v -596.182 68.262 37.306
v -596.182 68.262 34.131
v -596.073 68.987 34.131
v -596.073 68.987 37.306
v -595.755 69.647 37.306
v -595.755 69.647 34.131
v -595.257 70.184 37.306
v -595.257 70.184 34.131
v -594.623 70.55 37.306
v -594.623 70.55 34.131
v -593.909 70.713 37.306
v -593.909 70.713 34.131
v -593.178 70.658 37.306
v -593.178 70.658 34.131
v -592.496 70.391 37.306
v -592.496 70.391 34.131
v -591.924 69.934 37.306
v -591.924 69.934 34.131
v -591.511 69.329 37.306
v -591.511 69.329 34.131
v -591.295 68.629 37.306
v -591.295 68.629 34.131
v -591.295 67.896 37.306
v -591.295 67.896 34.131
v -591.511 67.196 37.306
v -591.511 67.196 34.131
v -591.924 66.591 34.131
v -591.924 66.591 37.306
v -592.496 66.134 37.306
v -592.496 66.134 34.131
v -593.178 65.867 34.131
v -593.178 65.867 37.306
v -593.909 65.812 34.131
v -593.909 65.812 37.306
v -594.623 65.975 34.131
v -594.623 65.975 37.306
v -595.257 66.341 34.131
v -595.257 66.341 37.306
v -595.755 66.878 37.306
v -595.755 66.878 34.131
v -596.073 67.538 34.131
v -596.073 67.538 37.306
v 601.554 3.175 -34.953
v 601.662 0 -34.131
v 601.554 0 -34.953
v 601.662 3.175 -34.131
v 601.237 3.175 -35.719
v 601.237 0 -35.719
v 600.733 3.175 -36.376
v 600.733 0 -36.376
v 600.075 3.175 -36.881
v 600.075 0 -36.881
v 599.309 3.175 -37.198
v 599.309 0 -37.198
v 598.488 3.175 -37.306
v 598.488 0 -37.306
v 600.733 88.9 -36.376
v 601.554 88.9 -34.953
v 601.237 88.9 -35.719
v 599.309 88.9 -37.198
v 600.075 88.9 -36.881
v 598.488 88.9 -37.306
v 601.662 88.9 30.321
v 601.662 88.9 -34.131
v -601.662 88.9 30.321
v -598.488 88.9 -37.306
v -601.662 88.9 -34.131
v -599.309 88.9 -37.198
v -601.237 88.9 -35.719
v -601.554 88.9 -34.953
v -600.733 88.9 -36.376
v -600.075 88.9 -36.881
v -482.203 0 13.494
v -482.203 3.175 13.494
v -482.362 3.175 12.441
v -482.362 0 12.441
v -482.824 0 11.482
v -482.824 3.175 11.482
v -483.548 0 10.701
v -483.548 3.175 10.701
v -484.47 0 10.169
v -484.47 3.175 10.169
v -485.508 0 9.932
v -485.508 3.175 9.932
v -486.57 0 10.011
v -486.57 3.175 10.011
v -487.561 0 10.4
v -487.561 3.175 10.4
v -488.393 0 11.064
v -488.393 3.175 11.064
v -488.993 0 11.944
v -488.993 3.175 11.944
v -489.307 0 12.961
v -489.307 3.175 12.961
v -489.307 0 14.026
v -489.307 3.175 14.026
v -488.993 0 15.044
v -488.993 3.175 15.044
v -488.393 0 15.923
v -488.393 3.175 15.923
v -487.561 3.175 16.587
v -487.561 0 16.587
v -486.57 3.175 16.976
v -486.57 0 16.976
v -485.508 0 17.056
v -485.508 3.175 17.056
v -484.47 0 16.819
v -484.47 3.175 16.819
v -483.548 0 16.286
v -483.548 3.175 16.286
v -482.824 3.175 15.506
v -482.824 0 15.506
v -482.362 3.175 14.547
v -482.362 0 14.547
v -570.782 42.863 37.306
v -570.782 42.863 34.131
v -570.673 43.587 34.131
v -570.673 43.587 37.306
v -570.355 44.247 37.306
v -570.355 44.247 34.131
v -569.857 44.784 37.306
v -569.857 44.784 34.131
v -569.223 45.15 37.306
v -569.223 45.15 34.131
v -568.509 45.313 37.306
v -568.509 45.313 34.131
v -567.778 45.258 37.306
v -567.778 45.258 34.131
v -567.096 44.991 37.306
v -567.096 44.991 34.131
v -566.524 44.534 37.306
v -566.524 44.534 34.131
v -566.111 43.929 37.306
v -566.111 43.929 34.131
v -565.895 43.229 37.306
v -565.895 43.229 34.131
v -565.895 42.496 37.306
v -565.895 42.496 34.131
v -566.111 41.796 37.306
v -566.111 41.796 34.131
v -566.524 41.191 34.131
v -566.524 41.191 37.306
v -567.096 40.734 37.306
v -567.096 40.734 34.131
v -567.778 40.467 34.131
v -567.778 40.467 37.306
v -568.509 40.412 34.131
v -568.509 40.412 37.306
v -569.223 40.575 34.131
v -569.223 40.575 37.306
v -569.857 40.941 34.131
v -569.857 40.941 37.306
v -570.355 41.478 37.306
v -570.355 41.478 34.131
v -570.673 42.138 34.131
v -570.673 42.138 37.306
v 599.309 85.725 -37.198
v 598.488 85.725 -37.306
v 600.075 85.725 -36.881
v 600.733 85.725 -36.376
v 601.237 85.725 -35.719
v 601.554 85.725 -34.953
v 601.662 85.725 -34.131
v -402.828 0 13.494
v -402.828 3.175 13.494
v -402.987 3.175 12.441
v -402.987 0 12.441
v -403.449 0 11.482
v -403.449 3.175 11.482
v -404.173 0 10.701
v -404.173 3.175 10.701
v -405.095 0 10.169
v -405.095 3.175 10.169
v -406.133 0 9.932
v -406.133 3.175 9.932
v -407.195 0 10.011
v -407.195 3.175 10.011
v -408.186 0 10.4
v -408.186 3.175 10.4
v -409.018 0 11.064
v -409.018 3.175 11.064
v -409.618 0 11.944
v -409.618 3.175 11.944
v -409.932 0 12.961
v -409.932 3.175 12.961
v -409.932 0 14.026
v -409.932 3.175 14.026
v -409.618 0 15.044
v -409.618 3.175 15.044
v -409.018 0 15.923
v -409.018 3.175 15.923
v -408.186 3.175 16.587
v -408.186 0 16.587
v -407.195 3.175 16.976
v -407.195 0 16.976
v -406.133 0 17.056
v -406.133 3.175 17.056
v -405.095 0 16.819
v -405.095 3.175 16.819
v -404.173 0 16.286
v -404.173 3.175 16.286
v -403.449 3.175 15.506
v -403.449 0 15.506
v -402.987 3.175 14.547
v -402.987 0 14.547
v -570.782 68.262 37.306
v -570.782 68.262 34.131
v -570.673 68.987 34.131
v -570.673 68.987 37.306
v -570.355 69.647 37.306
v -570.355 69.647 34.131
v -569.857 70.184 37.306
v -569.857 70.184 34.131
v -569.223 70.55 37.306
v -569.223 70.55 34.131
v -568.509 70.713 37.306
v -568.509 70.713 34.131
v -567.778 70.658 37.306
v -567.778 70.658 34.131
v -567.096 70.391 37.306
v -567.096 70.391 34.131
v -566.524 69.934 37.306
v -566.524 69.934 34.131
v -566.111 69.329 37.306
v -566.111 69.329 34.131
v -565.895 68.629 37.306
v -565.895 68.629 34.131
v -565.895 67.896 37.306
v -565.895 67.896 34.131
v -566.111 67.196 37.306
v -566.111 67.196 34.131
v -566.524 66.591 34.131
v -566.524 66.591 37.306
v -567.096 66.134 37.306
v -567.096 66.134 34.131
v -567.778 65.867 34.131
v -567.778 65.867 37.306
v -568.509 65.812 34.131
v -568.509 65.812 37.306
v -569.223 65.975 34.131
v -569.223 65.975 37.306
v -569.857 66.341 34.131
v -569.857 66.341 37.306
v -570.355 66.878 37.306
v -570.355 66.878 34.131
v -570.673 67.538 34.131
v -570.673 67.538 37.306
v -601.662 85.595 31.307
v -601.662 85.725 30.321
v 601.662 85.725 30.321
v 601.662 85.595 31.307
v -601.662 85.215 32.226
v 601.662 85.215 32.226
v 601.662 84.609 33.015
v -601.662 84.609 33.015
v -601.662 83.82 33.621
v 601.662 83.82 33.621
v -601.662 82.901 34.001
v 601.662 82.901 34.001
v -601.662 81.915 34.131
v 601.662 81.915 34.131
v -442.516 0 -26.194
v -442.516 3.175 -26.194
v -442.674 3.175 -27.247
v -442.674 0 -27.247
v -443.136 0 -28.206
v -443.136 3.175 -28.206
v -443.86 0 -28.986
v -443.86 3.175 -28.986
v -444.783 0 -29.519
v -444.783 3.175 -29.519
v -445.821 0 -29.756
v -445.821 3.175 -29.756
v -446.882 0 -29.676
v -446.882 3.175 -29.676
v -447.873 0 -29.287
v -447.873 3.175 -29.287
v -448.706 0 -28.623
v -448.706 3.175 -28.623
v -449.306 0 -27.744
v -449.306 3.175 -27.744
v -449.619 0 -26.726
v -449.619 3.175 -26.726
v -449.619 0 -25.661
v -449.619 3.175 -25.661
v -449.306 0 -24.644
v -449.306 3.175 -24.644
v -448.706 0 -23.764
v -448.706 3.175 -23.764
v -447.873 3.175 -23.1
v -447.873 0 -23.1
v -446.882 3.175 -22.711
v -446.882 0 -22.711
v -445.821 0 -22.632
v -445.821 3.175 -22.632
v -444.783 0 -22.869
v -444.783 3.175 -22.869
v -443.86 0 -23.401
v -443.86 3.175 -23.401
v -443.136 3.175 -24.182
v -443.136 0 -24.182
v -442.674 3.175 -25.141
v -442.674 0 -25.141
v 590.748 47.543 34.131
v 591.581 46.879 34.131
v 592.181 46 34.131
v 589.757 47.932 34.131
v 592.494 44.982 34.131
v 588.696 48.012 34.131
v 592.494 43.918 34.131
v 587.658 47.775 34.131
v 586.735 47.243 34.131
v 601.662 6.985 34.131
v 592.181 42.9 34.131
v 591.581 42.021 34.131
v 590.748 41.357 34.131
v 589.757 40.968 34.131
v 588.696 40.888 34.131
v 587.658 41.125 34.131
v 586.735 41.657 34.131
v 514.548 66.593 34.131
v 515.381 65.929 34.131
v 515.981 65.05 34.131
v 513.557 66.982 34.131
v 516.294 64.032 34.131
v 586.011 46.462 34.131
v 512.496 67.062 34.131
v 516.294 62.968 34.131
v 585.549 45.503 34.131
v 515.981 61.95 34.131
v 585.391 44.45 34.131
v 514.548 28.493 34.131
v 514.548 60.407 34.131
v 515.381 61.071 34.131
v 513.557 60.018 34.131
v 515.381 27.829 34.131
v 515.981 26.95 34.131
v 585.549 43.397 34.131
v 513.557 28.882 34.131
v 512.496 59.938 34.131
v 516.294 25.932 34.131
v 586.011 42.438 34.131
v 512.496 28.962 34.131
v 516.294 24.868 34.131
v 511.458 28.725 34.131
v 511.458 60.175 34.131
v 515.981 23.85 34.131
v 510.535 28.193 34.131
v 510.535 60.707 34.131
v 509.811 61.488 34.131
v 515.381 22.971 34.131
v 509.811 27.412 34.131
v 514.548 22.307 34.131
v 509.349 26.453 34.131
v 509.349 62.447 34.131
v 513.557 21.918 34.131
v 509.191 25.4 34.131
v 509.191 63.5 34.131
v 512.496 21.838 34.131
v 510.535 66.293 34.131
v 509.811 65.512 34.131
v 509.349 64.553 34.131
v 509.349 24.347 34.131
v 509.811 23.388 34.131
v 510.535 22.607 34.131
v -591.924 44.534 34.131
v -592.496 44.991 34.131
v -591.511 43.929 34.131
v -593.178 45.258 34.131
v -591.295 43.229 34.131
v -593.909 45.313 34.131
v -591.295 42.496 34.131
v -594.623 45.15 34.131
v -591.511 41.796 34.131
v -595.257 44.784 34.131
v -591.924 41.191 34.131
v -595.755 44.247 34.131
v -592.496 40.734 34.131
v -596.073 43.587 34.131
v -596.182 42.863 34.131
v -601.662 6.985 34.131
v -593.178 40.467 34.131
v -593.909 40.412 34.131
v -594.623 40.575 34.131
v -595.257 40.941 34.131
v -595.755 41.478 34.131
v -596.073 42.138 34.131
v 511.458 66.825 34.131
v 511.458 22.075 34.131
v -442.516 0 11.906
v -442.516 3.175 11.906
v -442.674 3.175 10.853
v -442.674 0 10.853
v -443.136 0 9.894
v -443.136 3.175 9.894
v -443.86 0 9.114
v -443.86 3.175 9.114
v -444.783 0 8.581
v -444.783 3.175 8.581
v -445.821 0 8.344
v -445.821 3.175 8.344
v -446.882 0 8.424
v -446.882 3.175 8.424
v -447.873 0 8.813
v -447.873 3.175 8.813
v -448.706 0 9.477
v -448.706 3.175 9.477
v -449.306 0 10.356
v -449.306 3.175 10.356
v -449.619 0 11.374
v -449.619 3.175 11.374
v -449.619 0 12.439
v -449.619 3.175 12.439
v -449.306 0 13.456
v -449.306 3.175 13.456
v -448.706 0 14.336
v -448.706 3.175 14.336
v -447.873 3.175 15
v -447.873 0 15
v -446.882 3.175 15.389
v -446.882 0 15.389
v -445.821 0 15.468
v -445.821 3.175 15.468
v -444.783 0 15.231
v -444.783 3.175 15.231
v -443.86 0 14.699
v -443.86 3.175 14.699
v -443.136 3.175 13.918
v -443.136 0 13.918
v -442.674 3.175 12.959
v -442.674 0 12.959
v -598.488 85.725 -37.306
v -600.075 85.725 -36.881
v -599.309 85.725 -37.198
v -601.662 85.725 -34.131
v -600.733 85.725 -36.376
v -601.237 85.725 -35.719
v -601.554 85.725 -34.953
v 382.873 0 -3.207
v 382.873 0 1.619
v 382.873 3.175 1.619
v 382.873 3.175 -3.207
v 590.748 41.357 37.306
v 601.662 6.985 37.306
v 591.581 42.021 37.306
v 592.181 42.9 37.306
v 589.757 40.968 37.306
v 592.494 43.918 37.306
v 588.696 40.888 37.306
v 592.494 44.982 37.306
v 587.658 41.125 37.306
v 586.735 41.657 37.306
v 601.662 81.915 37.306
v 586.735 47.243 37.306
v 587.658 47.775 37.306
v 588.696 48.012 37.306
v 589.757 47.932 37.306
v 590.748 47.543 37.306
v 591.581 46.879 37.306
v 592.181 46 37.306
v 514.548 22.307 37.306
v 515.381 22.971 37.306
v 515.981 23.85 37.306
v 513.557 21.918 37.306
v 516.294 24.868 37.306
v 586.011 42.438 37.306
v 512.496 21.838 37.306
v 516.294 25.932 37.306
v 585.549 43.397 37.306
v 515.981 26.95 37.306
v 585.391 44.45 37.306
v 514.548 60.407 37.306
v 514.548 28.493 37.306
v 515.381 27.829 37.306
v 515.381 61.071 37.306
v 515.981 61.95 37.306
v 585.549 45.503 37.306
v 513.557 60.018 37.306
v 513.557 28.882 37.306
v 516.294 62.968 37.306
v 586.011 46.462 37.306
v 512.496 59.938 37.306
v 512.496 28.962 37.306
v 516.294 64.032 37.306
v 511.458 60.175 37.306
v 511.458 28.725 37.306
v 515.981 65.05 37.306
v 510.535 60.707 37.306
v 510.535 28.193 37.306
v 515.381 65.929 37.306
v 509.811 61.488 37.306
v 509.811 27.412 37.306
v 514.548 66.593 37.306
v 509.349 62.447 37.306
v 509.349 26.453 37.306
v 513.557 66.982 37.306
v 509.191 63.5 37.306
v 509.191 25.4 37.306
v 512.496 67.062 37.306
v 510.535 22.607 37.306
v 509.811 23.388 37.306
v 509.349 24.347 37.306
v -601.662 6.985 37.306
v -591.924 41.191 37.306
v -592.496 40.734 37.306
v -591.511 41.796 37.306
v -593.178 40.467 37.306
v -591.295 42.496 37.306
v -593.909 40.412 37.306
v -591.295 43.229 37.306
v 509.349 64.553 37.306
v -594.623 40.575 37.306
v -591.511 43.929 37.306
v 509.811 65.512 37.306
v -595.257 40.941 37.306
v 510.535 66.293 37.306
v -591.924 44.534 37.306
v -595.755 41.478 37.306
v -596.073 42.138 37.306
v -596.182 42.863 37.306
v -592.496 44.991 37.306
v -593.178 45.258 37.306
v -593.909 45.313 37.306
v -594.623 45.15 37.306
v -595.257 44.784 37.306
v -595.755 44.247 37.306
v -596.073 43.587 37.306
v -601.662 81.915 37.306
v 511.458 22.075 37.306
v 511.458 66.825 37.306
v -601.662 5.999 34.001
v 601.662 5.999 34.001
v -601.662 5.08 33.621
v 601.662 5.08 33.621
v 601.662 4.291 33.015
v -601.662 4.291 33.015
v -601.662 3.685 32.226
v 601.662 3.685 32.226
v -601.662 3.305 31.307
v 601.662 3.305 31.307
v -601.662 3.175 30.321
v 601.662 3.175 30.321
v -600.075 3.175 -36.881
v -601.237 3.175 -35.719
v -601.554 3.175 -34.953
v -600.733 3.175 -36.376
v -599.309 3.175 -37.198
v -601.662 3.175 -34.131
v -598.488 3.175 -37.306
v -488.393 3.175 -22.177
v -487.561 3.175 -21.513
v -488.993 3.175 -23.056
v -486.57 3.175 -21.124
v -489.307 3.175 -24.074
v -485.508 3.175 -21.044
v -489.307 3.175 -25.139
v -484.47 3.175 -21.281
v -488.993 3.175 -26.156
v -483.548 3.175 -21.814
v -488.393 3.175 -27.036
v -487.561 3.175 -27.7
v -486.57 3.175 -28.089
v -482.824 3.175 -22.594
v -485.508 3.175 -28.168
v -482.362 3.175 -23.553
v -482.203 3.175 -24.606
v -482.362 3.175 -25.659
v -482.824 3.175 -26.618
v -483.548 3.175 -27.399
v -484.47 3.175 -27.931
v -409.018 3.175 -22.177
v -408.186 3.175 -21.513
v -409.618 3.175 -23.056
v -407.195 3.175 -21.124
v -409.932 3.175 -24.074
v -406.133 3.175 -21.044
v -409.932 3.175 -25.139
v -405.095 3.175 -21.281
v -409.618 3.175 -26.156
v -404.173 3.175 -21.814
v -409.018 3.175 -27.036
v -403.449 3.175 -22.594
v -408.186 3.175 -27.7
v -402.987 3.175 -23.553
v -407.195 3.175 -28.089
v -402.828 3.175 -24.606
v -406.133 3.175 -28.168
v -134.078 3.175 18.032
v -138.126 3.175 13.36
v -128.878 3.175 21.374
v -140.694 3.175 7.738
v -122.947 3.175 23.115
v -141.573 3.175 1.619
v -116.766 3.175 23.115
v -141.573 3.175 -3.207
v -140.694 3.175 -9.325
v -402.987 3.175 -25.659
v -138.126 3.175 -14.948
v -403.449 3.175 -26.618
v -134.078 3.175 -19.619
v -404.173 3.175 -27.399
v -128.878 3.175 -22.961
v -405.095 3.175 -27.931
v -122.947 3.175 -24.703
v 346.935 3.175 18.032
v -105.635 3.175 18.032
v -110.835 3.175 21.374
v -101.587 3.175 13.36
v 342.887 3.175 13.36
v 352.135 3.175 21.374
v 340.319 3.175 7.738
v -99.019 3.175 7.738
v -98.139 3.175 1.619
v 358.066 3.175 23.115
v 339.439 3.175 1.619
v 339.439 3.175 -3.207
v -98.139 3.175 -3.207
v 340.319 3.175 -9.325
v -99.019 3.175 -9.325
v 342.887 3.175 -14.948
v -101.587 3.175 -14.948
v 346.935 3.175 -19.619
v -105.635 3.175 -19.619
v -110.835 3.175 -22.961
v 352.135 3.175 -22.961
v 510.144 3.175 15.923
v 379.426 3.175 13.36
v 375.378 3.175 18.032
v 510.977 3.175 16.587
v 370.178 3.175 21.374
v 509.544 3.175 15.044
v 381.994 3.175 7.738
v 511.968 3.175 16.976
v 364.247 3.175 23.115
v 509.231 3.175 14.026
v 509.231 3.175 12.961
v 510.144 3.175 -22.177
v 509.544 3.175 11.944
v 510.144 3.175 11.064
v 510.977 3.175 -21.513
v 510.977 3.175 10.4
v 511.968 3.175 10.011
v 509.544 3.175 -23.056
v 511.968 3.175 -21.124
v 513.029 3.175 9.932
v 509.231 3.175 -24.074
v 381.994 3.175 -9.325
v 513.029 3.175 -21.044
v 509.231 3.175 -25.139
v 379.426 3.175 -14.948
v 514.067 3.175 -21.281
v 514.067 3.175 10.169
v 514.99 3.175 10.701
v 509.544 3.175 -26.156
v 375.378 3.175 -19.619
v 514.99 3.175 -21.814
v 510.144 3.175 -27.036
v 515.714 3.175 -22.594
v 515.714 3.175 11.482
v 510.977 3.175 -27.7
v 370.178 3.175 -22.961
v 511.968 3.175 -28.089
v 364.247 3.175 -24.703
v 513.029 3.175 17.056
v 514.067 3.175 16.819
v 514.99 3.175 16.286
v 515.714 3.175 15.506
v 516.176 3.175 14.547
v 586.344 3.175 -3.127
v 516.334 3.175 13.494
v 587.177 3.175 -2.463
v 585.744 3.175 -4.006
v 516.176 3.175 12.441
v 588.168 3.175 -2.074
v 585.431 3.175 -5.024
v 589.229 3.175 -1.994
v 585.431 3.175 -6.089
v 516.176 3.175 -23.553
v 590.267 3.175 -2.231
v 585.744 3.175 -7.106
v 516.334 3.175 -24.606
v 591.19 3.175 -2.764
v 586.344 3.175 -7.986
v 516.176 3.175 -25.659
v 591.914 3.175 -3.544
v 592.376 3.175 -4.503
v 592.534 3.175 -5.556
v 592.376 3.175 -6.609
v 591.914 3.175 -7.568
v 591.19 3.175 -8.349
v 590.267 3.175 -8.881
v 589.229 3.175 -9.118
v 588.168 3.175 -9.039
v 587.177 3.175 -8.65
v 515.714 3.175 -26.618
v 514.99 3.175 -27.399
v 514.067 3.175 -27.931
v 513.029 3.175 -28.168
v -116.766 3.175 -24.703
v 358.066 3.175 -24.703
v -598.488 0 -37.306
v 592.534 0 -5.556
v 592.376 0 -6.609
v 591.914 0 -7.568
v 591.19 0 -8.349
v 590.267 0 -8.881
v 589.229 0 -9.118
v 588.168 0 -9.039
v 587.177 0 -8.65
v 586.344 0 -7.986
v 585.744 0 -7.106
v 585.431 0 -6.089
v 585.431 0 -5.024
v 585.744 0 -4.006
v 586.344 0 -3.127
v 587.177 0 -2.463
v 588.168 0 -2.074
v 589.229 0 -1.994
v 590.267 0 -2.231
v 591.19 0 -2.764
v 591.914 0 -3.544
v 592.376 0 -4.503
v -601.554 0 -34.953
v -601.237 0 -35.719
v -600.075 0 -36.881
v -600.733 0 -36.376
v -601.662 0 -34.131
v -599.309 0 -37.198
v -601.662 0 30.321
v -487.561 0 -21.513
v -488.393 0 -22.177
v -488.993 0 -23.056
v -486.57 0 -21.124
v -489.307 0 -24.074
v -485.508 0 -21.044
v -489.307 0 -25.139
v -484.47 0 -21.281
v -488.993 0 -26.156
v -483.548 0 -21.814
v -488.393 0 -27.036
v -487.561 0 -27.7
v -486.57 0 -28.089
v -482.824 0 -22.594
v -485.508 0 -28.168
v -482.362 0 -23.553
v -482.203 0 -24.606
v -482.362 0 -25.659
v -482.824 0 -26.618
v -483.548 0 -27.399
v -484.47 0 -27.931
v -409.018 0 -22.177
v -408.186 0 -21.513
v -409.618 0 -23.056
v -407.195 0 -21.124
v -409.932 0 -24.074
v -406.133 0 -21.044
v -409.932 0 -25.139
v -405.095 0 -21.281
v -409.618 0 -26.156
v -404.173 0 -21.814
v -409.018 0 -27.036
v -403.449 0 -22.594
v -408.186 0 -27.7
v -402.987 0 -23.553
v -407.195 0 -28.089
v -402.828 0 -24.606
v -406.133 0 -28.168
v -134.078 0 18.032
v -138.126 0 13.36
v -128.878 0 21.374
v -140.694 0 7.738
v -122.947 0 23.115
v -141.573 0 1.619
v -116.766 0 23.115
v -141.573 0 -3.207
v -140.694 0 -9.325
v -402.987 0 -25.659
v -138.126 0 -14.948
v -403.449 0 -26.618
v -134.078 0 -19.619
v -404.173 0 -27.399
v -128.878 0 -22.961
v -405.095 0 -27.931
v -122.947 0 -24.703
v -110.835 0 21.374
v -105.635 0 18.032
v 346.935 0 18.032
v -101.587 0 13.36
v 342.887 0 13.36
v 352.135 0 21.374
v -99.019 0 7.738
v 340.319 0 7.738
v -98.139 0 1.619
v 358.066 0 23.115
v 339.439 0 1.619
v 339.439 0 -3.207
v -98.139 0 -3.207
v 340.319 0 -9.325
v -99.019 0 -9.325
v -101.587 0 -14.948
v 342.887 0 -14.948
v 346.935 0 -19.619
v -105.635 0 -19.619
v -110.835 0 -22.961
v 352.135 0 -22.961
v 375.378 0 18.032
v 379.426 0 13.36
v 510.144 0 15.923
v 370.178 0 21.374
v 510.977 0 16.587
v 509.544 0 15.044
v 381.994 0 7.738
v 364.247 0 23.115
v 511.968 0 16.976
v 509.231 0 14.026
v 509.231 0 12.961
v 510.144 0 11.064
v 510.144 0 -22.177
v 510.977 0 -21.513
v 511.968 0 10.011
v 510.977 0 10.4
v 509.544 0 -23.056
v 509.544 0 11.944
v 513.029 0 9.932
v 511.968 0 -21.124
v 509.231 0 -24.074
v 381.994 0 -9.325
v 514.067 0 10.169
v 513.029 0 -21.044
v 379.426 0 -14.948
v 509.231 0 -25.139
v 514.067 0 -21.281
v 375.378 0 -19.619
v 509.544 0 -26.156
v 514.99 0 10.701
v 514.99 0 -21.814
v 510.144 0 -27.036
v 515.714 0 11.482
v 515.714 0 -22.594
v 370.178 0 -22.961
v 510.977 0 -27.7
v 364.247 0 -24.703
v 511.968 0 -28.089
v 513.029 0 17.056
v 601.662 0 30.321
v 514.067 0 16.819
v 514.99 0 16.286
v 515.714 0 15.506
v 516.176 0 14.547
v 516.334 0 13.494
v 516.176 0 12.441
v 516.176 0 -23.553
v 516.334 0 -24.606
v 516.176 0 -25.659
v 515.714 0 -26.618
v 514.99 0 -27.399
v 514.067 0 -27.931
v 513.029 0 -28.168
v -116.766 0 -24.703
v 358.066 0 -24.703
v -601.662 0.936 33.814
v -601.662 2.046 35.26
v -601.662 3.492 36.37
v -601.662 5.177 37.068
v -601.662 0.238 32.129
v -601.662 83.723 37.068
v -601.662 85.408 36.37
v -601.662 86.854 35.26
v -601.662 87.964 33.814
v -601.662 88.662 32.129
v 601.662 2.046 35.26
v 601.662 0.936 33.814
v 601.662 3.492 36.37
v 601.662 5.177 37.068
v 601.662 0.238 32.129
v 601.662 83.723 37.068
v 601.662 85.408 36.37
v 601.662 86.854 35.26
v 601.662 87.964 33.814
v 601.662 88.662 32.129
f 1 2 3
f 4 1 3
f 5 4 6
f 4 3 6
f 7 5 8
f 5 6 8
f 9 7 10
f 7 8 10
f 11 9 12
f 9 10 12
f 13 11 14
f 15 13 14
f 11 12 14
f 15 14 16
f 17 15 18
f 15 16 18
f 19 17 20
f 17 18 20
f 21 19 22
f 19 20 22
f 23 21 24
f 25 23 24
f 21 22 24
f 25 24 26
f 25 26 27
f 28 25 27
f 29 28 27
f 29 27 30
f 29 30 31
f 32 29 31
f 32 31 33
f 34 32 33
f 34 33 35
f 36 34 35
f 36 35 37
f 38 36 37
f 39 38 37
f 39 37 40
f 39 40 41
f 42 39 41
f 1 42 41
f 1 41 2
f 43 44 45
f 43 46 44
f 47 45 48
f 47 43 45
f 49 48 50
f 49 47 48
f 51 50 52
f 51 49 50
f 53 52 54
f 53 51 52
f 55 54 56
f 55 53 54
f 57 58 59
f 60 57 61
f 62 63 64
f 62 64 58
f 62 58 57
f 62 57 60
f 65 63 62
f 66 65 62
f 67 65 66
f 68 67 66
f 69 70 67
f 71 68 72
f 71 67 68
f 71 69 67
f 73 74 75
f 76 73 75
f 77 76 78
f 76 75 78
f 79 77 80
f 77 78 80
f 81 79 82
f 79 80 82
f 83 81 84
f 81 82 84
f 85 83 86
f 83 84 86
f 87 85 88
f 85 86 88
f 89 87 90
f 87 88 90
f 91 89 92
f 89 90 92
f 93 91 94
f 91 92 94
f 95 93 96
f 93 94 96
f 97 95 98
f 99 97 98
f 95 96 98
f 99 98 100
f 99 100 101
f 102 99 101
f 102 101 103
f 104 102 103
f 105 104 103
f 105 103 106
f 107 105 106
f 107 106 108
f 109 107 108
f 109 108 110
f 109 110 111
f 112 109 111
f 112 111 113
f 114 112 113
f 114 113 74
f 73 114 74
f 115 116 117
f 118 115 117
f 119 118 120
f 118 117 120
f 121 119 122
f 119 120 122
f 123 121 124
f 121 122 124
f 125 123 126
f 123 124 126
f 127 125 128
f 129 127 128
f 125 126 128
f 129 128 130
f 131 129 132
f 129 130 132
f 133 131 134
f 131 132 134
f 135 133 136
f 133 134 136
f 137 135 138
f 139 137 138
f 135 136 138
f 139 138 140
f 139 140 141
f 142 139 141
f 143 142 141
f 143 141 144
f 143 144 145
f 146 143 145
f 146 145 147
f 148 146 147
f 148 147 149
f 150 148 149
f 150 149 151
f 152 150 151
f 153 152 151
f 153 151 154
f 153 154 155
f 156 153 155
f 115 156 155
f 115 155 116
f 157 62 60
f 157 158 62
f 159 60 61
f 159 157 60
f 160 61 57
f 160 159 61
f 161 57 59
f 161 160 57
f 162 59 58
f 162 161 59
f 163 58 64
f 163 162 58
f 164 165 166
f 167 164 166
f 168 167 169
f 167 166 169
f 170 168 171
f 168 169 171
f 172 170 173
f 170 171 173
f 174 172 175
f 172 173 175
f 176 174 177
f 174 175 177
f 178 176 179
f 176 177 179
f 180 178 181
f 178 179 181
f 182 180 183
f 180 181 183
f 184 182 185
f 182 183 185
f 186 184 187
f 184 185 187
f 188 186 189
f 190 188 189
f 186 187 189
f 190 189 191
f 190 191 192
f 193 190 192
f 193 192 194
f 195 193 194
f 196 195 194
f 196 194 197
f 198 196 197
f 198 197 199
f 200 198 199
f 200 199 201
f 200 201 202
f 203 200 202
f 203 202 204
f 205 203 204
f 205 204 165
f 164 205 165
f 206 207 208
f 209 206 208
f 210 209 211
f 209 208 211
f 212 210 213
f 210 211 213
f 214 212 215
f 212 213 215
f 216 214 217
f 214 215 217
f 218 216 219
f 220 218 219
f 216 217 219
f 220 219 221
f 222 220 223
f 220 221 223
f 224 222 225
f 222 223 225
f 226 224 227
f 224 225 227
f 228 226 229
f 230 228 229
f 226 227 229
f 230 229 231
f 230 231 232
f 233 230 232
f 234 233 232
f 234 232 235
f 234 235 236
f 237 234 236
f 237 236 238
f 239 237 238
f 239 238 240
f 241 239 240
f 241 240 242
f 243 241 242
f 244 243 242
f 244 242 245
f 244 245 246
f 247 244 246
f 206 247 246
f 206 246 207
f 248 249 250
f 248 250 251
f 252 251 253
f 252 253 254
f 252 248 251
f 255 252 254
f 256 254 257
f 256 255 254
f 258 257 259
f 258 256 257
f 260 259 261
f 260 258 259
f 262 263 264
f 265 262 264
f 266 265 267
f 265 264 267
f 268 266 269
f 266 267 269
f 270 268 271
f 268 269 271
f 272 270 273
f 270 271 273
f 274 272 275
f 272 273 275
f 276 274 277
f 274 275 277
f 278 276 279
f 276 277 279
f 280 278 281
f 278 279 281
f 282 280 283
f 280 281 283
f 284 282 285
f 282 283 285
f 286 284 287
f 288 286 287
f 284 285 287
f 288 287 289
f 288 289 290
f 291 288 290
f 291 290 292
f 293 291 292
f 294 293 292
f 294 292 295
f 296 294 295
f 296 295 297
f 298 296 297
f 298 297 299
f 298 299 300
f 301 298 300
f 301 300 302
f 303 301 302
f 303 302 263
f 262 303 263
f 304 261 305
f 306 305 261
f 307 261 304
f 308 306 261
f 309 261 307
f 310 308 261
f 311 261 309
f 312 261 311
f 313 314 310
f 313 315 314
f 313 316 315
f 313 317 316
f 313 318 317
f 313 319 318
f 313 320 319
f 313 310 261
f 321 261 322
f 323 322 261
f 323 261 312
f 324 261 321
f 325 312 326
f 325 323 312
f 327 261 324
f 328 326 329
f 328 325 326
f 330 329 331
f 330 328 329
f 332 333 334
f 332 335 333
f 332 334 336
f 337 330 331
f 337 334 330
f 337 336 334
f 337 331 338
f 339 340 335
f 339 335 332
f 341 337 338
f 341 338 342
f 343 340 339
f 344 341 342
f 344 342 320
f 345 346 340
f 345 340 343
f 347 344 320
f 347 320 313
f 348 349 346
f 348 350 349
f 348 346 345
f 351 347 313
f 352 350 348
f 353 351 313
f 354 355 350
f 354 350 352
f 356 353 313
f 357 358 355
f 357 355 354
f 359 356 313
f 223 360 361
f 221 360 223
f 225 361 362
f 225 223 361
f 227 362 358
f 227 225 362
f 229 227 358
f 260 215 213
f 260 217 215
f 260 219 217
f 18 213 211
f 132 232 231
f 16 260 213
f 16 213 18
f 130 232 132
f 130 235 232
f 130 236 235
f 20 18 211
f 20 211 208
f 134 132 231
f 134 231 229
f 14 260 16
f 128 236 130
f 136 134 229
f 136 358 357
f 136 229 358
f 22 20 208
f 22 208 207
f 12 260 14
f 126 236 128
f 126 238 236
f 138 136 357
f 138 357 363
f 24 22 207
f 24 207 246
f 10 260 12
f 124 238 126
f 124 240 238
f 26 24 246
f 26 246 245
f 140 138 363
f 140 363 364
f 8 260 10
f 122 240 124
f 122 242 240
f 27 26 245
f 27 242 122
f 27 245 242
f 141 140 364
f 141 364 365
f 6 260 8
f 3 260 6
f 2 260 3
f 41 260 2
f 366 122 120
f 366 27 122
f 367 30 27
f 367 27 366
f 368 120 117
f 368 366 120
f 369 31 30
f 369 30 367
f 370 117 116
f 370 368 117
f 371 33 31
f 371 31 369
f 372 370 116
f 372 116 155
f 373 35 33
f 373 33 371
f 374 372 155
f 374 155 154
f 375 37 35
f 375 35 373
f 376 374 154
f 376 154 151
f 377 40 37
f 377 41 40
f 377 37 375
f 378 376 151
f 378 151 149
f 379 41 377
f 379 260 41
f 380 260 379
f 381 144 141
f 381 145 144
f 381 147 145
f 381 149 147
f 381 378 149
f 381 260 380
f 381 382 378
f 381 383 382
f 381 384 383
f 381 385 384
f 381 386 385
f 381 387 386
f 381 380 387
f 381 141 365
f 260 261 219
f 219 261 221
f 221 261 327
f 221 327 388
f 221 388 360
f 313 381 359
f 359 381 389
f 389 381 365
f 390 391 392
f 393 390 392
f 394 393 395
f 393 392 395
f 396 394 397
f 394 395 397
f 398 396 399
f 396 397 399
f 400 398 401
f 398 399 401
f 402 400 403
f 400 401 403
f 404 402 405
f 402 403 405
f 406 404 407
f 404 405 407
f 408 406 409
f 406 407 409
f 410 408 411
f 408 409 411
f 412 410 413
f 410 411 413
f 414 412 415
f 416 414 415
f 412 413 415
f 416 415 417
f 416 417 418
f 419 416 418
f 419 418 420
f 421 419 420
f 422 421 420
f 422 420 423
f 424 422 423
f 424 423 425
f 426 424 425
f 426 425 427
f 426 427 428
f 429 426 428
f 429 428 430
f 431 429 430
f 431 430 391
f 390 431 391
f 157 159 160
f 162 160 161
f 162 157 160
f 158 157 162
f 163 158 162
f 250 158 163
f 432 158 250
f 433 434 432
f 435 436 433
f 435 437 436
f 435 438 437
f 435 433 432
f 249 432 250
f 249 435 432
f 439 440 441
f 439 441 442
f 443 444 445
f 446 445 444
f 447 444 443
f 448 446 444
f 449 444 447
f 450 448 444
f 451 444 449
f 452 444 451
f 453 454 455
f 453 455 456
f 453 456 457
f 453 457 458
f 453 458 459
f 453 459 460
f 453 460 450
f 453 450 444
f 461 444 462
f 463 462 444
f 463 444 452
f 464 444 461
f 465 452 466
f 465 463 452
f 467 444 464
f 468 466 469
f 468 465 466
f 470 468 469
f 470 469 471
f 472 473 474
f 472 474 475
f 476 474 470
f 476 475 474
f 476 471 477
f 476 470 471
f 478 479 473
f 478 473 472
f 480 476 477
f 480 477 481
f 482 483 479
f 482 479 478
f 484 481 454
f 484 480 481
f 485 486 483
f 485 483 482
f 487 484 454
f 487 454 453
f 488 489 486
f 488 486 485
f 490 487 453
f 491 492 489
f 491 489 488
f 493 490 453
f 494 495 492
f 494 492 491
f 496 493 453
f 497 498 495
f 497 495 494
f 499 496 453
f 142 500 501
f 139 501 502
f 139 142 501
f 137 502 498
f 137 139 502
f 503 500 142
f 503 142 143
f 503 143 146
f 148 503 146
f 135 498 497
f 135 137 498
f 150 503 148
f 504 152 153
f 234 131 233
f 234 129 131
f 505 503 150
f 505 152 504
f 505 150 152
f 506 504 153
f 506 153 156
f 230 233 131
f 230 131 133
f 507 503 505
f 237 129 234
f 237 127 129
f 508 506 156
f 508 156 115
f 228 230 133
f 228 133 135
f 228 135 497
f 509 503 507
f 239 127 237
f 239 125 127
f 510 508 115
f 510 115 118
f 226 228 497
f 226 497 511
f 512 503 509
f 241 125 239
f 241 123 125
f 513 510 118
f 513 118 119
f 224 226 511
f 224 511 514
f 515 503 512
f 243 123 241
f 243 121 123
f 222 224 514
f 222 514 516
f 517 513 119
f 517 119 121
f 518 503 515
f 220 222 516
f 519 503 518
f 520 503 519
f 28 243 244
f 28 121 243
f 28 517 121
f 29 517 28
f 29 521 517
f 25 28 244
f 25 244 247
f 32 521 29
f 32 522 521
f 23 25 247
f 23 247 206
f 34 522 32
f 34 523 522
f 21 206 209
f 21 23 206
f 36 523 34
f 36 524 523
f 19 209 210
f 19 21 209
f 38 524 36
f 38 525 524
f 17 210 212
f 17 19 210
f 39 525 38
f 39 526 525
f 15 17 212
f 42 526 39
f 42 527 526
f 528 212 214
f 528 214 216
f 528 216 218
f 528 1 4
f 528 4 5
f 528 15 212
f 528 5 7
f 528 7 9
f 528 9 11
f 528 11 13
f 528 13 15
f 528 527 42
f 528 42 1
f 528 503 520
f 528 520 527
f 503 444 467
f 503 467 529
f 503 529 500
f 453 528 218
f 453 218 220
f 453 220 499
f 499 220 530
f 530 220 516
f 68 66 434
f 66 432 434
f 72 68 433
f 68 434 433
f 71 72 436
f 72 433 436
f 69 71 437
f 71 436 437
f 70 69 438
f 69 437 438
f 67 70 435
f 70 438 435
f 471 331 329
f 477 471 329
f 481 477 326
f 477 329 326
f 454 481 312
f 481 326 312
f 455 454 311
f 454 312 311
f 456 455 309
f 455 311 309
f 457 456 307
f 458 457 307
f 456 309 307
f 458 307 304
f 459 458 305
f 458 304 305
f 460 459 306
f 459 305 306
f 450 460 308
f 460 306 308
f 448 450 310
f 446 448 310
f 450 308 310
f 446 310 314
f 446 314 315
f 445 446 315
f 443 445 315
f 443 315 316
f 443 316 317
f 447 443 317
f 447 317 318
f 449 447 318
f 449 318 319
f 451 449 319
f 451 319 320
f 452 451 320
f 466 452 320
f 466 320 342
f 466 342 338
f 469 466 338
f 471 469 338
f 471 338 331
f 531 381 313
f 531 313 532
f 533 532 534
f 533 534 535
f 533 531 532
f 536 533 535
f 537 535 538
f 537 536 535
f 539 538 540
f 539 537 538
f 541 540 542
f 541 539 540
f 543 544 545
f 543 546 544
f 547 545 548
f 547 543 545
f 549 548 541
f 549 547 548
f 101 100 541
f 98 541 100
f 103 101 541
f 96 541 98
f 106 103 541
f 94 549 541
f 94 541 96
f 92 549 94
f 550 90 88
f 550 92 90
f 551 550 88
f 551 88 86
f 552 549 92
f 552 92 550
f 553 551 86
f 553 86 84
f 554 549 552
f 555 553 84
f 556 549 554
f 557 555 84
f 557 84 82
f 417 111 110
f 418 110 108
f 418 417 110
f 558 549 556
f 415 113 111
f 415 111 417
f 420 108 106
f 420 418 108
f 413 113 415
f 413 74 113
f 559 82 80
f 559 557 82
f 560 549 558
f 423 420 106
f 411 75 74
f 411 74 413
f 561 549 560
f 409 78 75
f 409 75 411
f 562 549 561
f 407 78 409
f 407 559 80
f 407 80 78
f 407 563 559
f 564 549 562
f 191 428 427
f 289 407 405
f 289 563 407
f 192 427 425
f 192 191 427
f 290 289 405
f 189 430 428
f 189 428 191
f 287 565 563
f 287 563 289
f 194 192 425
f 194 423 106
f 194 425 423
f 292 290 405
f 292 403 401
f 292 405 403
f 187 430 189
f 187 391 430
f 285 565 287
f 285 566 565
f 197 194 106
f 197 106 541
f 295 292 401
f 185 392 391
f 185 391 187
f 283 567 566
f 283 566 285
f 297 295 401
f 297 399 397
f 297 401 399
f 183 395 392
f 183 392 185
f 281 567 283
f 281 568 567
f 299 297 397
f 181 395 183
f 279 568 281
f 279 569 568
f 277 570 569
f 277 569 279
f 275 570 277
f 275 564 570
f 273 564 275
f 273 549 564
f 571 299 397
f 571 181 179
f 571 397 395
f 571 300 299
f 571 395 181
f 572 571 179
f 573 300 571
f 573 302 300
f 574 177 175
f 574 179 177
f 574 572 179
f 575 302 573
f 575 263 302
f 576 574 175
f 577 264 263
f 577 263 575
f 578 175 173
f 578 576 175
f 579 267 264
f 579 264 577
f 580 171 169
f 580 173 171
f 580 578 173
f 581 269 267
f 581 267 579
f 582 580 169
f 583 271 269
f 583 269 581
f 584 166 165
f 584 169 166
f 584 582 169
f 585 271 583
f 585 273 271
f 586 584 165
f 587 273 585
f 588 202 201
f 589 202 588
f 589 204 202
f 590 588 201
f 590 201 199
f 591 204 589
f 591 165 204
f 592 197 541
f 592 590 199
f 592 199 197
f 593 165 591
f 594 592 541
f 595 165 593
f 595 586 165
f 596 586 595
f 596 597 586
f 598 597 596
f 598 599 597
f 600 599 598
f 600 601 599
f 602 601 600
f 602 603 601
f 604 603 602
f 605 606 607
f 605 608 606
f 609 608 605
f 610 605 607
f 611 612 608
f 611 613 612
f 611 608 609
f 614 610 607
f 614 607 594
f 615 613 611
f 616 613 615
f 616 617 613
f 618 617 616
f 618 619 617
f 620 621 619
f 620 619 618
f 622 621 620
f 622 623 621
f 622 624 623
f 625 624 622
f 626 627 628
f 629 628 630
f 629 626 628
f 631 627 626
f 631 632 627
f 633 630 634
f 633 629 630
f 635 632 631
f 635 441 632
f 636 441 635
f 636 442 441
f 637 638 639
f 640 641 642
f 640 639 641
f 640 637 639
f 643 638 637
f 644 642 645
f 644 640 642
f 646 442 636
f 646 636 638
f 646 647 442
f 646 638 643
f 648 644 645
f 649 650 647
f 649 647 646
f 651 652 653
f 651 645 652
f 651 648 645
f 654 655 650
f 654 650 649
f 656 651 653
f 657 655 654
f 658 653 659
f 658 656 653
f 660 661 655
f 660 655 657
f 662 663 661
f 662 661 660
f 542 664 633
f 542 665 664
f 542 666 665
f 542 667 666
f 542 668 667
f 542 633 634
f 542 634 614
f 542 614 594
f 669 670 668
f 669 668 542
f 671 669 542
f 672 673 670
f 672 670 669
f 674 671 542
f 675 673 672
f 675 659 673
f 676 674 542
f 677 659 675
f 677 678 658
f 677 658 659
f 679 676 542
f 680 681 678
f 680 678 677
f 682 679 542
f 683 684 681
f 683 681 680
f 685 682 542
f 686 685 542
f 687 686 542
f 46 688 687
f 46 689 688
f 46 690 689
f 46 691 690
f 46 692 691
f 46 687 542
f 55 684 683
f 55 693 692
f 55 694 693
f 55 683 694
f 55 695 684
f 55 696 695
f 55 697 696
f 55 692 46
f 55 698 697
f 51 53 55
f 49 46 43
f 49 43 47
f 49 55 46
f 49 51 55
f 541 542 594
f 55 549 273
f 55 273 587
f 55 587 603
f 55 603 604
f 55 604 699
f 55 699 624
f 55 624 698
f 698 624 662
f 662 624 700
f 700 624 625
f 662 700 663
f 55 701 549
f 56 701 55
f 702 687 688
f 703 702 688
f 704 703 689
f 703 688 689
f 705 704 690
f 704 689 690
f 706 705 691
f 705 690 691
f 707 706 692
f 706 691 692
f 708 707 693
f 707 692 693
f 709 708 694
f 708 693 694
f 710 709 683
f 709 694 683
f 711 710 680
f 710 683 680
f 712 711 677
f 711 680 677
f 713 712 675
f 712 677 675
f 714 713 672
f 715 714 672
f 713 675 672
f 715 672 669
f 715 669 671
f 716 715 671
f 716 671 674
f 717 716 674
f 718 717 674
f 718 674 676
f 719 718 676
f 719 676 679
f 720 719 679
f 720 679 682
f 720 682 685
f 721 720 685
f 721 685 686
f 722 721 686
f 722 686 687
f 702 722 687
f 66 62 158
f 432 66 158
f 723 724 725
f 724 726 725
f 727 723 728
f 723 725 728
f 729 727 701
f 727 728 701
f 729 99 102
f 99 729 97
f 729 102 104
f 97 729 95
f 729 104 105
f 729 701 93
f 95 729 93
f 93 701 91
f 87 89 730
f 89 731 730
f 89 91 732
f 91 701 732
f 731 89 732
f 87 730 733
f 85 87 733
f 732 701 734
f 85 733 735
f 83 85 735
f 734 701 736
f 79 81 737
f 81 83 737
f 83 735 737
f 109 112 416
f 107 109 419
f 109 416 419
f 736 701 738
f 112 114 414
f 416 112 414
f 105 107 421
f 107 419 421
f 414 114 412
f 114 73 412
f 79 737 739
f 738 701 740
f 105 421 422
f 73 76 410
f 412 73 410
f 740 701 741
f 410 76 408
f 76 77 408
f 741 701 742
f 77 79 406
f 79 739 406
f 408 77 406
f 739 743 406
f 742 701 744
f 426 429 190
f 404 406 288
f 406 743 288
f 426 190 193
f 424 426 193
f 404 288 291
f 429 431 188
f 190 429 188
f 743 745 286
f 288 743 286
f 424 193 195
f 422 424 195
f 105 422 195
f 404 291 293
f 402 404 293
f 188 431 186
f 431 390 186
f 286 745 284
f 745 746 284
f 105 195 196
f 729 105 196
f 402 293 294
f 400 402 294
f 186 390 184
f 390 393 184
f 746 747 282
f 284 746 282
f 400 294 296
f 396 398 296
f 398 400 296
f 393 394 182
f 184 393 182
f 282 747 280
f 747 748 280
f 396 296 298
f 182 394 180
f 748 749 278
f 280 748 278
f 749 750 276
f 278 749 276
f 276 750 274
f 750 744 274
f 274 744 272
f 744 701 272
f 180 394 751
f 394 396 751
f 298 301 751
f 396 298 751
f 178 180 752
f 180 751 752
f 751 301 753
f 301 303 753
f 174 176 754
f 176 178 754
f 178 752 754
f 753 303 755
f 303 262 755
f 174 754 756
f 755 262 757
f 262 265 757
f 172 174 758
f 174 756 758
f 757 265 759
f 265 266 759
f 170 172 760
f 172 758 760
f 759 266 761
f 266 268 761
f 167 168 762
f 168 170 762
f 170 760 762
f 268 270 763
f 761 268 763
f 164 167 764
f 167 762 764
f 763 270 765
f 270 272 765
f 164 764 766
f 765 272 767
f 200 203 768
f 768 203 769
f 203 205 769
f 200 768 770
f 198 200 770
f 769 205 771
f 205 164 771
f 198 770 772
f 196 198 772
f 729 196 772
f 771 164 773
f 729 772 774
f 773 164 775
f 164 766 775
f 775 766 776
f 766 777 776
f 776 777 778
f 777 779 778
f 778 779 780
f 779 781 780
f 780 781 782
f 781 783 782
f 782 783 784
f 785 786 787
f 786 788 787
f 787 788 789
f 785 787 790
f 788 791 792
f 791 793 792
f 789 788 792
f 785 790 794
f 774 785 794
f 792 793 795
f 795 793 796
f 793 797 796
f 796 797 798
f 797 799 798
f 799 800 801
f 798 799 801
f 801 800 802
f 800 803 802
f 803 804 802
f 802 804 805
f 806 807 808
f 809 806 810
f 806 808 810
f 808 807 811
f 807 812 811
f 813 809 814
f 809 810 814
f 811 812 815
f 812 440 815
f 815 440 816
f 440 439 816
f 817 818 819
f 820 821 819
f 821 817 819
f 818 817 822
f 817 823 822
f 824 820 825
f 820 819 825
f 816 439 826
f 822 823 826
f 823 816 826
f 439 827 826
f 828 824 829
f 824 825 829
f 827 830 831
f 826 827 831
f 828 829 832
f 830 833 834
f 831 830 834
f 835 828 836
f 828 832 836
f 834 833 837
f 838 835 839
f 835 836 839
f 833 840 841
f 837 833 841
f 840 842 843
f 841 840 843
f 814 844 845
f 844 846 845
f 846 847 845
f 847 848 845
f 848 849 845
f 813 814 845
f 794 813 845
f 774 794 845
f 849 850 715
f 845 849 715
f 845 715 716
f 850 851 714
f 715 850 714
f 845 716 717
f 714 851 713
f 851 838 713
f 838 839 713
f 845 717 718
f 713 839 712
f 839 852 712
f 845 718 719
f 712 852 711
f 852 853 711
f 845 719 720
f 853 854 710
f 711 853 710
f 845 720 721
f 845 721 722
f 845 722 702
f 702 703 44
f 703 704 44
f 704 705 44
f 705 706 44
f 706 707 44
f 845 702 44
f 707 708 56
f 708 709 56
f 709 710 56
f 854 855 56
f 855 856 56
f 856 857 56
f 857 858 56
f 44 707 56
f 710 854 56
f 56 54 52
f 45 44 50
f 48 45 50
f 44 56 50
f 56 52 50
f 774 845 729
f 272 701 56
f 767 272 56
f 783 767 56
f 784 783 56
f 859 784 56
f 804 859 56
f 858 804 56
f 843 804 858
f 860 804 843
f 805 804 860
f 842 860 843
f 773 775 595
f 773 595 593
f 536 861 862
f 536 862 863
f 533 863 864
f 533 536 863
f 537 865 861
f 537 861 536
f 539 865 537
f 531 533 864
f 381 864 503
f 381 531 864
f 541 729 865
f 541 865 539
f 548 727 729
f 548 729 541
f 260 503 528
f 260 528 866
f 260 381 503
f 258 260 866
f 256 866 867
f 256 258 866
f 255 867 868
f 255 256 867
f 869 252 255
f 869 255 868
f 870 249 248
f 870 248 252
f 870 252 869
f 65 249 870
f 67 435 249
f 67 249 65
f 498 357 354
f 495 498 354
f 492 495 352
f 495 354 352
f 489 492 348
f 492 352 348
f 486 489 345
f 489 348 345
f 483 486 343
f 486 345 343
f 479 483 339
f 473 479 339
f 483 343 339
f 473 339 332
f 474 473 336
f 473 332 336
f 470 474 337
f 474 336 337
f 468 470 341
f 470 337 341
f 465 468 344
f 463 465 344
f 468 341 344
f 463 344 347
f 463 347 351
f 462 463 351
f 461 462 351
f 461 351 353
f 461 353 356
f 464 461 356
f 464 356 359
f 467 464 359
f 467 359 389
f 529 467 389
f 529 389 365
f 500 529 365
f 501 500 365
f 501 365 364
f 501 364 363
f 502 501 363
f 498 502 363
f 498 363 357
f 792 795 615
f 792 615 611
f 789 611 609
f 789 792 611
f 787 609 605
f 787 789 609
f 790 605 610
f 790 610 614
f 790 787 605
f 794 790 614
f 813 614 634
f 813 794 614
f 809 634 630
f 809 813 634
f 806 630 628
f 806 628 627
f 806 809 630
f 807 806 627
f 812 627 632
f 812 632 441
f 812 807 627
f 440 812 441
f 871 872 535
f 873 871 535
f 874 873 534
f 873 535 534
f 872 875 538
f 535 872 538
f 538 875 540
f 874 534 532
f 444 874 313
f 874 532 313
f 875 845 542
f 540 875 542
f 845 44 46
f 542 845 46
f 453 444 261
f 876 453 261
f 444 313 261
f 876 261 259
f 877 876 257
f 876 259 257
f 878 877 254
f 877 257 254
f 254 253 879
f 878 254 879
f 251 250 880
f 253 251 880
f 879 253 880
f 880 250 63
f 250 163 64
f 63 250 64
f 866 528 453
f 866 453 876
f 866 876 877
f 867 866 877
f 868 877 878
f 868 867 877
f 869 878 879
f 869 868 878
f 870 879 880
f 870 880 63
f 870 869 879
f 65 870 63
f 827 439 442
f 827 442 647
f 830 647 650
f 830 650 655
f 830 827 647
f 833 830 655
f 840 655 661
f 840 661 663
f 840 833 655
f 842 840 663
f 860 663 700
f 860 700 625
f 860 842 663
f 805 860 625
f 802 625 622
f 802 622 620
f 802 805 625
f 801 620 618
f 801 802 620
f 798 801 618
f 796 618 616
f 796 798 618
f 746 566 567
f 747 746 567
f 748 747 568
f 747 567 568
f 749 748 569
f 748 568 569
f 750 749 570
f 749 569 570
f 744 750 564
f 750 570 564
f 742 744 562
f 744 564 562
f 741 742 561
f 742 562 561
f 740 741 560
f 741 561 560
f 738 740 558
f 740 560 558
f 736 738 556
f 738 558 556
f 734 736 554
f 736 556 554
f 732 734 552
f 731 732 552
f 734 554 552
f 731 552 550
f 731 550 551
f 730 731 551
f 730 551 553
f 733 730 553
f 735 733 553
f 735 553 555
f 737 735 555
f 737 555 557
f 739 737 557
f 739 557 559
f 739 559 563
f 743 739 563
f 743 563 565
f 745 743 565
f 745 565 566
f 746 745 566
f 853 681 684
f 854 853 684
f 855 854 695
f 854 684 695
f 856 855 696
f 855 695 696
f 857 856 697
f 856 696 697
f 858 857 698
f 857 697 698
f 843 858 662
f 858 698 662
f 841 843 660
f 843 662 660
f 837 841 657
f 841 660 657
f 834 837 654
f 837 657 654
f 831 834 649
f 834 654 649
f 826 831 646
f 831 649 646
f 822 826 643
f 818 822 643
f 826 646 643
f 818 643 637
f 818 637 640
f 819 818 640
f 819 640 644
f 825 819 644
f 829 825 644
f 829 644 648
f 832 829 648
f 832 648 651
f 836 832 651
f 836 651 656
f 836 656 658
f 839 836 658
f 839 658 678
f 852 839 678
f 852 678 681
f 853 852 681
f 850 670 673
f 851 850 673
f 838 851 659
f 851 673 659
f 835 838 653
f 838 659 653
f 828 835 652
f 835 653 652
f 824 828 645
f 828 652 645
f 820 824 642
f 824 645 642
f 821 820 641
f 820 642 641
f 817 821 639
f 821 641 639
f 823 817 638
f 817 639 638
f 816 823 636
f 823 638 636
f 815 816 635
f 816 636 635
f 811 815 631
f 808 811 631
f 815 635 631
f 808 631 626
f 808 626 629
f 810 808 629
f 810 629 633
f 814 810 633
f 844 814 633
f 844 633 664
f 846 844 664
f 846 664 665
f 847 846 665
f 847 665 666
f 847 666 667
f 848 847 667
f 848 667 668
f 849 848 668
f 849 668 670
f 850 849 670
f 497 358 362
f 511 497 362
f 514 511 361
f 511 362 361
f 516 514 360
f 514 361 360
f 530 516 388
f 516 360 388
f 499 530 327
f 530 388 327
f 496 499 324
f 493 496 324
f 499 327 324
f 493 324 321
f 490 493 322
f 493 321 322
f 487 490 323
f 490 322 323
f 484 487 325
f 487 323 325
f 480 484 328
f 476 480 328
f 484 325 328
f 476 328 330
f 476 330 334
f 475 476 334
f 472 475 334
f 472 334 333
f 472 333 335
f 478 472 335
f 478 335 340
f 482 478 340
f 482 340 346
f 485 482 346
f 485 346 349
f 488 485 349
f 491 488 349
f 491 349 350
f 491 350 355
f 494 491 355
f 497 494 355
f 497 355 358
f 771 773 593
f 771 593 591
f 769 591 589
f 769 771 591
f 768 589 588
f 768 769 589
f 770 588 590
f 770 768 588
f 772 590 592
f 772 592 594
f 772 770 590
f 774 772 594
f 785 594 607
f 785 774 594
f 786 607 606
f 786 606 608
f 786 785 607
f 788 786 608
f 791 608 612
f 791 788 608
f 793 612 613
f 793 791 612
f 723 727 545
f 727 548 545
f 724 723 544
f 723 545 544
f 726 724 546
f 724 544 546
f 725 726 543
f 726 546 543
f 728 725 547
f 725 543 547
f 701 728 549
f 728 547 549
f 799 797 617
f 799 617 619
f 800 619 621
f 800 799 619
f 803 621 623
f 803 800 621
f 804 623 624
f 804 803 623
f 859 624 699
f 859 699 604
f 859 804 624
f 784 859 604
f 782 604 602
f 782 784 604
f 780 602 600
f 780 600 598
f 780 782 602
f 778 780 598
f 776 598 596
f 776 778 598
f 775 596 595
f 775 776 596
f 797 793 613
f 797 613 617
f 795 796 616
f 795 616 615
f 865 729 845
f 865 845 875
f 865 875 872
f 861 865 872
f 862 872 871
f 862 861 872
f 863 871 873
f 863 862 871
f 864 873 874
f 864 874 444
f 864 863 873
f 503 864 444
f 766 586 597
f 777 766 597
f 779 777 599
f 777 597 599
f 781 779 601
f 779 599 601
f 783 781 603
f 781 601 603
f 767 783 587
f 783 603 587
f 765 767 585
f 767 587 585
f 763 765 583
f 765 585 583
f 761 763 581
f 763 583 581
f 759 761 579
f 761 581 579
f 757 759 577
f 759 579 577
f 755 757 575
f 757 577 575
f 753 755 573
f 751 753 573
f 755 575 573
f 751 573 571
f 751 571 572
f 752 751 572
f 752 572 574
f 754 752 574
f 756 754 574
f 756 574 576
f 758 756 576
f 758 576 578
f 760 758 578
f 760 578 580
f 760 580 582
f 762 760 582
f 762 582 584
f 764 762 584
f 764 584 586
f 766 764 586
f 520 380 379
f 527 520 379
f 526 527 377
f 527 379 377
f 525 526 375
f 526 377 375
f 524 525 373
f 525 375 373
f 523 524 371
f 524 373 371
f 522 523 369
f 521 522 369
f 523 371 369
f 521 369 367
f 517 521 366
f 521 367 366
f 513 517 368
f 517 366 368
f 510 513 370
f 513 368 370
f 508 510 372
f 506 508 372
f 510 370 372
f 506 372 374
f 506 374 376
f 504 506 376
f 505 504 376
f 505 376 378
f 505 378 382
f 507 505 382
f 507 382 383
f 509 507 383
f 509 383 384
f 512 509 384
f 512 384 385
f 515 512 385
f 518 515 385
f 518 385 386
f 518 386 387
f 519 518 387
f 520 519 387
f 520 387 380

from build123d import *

# Parameters (mm, degrees)
SKETCH1_W                           = 1203.325
SKETCH1_H                           = 74.6125
BASE_FLANGE1_DEPTH                  = 3.175
EDGE_FLANGE1_STRIP_W                = 20.32
EDGE_FLANGE1_STRIP_H                = 3.175
EDGE_FLANGE1_STRIP_CUT_DEPTH        = 1203.325
EDGE_FLANGE1_DEPTH                  = 1203.325
EDGE_FLANGE2_STRIP_W                = 20.32
EDGE_FLANGE2_STRIP_H                = 3.175
EDGE_FLANGE2_STRIP_CUT_DEPTH        = 1203.325
EDGE_FLANGE2_DEPTH                  = 1203.325
F_9_32_0_28125_DIAMETER_HOLE3_D     = 7.14375
F_9_32_0_28125_DIAMETER_HOLE3_DEPTH = 3.175
FILLET1_R                           = 3.175
F_9_32_0_28125_DIAMETER_HOLE1_D     = 7.14375
F_9_32_0_28125_DIAMETER_HOLE1_DEPTH = 3.175
F_9_32_0_28125_DIAMETER_HOLE2_D     = 7.14375
F_1_1_71_DOWEL_SLOT1_DEPTH          = 3.175
F_10_0_1935_DIAMETER_HOLE1_D        = 4.9149
LPATTERN2_COUNT                     = 2
LPATTERN2_PITCH                     = 25.4
LPATTERN2_COUNT_DIR2                = 2
LPATTERN2_PITCH_DIR2                = 25.4


# Read off the part's stored shape, not the designer's step: 1 (1.71) Dowel Slot1
# Sheet-metal steps are written as plain solids
with BuildPart() as part:
    # Sketch1 → Base-Flange1 (new body)
    with BuildSketch(Plane(origin=(0, 0, 0), x_dir=(1, 0, 0), z_dir=(0, 1, 0))):
        Rectangle(SKETCH1_W, SKETCH1_H)
    extrude(amount=BASE_FLANGE1_DEPTH)

    # Edge-Flange1 strip (across the edge) → Edge-Flange1 strip cut (cut)
    with BuildSketch(Plane(origin=(-601.6625, 3.175, 37.30625), x_dir=(0, 0, -1), z_dir=(1, 0, 0))):
        with Locations((-3.175, -1.5875)):
            Rectangle(EDGE_FLANGE1_STRIP_W, EDGE_FLANGE1_STRIP_H)
    extrude(amount=EDGE_FLANGE1_STRIP_CUT_DEPTH, mode=Mode.SUBTRACT)

    # Edge-Flange1 section (across the edge) → Edge-Flange1 (add)
    with BuildSketch(Plane(origin=(-601.6625, 3.175, 37.30625), x_dir=(0, 0, -1), z_dir=(1, 0, 0))):
        with BuildLine():
            Line((0, 3.81), (0, 85.725))
            Line((0, 85.725), (3.175, 85.725))
            Line((3.175, 85.725), (3.175, 3.81))
            ThreePointArc((3.175, 3.81), (4.290923164, 1.115923164), (6.985, 0))
            Line((6.985, 0), (6.985, -3.175))
            ThreePointArc((6.985, -3.175), (2.045859133, -1.129140867), (0, 3.81))
        make_face()
    extrude(amount=EDGE_FLANGE1_DEPTH)

    # Edge-Flange2 strip (across the edge) → Edge-Flange2 strip cut (cut)
    with BuildSketch(Plane(origin=(-601.6625, 88.9, 34.13125), x_dir=(0, -1, 0), z_dir=(1, 0, 0))):
        with Locations((-3.175, -1.5875)):
            Rectangle(EDGE_FLANGE2_STRIP_W, EDGE_FLANGE2_STRIP_H)
    extrude(amount=EDGE_FLANGE2_STRIP_CUT_DEPTH, mode=Mode.SUBTRACT)

    # Edge-Flange2 section (across the edge) → Edge-Flange2 (add)
    with BuildSketch(Plane(origin=(-601.6625, 88.9, 34.13125), x_dir=(0, -1, 0), z_dir=(1, 0, 0))):
        with BuildLine():
            Line((0, 3.81), (0, 71.4375))
            Line((0, 71.4375), (3.175, 71.4375))
            Line((3.175, 71.4375), (3.175, 3.81))
            ThreePointArc((3.175, 3.81), (4.290923164, 1.115923164), (6.985, 0))
            Line((6.985, 0), (6.985, -3.175))
            ThreePointArc((6.985, -3.175), (2.045859133, -1.129140867), (0, 3.81))
        make_face()
    extrude(amount=EDGE_FLANGE2_DEPTH)

    # 9/32 (0.28125) Diameter Hole3
    with Locations(Plane(origin=(0, 0, 0), x_dir=(-1, 0, 0), z_dir=(0, -1, 0))):
        with Locations((446.0875, -11.90625), (446.0875, 26.19375), (485.775, 24.60625), (485.775, -13.49375), (406.4, -13.49375), (406.4, 24.60625)):
            Hole(F_9_32_0_28125_DIAMETER_HOLE3_D / 2, depth=F_9_32_0_28125_DIAMETER_HOLE3_DEPTH)

    # Fillet1
    fillet1_edges = [part.edges().sort_by_distance(p)[0] for p in [
        (-601.6625, 87.3125, -37.30625),
        (601.6625, 87.3125, -37.30625),
        (-601.6625, 1.5875, -37.30625),
        (601.6625, 1.5875, -37.30625),
    ]]
    fillet(fillet1_edges, radius=FILLET1_R)

    # 9/32 (0.28125) Diameter Hole1
    with Locations(Plane(origin=(0, 0, 0), x_dir=(-1, 0, 0), z_dir=(0, -1, 0))):
        with Locations((-588.9625, 5.55625), (-512.7625, -13.49375), (-512.7625, 24.60625)):
            Hole(F_9_32_0_28125_DIAMETER_HOLE1_D / 2, depth=F_9_32_0_28125_DIAMETER_HOLE1_DEPTH)

    # 9/32 (0.28125) Diameter Hole2 (through all)
    with Locations(Plane.XY.offset(37.30625)):
        with Locations((588.9625, 44.45), (512.7625, 63.5), (512.7625, 25.4)):
            Hole(F_9_32_0_28125_DIAMETER_HOLE2_D / 2)

    # 1 (1.71) Dowel Slot1 outline → 1 (1.71) Dowel Slot1 (cut)
    with BuildSketch(Plane(origin=(0, 0, 0), x_dir=(1, 0, 0), z_dir=(0, 1, 0))):
        with BuildLine():
            ThreePointArc((382.87325, 3.20675), (361.15625, 24.92375), (339.43925, 3.20675))
            Line((339.43925, 3.20675), (339.43925, -1.61925))
            ThreePointArc((339.43925, -1.61925), (361.15625, -23.33625), (382.87325, -1.61925))
            Line((382.87325, -1.61925), (382.87325, 3.20675))
        make_face()
        with BuildLine():
            ThreePointArc((-98.13925, 3.20675), (-119.85625, 24.92375), (-141.57325, 3.20675))
            Line((-141.57325, 3.20675), (-141.57325, -1.61925))
            ThreePointArc((-141.57325, -1.61925), (-119.85625, -23.33625), (-98.13925, -1.61925))
            Line((-98.13925, -1.61925), (-98.13925, 3.20675))
        make_face()
    extrude(amount=F_1_1_71_DOWEL_SLOT1_DEPTH, mode=Mode.SUBTRACT)

    # #10 (0.1935) Diameter Hole1 (through all)
    with Locations(Plane.XY.offset(37.30625)):
        with Locations((-593.725, 68.2625)):
            f_10_0_1935_diameter_hole1 = Hole(F_10_0_1935_DIAMETER_HOLE1_D / 2)

    # LPattern2: 10 _0.1935_ Diameter Hole1 2 × 2
    with Locations(*[(i * LPATTERN2_PITCH, -j * LPATTERN2_PITCH_DIR2, 0) for i in range(LPATTERN2_COUNT) for j in range(LPATTERN2_COUNT_DIR2) if (i, j) != (0, 0)]):
        add(f_10_0_1935_diameter_hole1, mode=Mode.SUBTRACT)


solid = part.part
